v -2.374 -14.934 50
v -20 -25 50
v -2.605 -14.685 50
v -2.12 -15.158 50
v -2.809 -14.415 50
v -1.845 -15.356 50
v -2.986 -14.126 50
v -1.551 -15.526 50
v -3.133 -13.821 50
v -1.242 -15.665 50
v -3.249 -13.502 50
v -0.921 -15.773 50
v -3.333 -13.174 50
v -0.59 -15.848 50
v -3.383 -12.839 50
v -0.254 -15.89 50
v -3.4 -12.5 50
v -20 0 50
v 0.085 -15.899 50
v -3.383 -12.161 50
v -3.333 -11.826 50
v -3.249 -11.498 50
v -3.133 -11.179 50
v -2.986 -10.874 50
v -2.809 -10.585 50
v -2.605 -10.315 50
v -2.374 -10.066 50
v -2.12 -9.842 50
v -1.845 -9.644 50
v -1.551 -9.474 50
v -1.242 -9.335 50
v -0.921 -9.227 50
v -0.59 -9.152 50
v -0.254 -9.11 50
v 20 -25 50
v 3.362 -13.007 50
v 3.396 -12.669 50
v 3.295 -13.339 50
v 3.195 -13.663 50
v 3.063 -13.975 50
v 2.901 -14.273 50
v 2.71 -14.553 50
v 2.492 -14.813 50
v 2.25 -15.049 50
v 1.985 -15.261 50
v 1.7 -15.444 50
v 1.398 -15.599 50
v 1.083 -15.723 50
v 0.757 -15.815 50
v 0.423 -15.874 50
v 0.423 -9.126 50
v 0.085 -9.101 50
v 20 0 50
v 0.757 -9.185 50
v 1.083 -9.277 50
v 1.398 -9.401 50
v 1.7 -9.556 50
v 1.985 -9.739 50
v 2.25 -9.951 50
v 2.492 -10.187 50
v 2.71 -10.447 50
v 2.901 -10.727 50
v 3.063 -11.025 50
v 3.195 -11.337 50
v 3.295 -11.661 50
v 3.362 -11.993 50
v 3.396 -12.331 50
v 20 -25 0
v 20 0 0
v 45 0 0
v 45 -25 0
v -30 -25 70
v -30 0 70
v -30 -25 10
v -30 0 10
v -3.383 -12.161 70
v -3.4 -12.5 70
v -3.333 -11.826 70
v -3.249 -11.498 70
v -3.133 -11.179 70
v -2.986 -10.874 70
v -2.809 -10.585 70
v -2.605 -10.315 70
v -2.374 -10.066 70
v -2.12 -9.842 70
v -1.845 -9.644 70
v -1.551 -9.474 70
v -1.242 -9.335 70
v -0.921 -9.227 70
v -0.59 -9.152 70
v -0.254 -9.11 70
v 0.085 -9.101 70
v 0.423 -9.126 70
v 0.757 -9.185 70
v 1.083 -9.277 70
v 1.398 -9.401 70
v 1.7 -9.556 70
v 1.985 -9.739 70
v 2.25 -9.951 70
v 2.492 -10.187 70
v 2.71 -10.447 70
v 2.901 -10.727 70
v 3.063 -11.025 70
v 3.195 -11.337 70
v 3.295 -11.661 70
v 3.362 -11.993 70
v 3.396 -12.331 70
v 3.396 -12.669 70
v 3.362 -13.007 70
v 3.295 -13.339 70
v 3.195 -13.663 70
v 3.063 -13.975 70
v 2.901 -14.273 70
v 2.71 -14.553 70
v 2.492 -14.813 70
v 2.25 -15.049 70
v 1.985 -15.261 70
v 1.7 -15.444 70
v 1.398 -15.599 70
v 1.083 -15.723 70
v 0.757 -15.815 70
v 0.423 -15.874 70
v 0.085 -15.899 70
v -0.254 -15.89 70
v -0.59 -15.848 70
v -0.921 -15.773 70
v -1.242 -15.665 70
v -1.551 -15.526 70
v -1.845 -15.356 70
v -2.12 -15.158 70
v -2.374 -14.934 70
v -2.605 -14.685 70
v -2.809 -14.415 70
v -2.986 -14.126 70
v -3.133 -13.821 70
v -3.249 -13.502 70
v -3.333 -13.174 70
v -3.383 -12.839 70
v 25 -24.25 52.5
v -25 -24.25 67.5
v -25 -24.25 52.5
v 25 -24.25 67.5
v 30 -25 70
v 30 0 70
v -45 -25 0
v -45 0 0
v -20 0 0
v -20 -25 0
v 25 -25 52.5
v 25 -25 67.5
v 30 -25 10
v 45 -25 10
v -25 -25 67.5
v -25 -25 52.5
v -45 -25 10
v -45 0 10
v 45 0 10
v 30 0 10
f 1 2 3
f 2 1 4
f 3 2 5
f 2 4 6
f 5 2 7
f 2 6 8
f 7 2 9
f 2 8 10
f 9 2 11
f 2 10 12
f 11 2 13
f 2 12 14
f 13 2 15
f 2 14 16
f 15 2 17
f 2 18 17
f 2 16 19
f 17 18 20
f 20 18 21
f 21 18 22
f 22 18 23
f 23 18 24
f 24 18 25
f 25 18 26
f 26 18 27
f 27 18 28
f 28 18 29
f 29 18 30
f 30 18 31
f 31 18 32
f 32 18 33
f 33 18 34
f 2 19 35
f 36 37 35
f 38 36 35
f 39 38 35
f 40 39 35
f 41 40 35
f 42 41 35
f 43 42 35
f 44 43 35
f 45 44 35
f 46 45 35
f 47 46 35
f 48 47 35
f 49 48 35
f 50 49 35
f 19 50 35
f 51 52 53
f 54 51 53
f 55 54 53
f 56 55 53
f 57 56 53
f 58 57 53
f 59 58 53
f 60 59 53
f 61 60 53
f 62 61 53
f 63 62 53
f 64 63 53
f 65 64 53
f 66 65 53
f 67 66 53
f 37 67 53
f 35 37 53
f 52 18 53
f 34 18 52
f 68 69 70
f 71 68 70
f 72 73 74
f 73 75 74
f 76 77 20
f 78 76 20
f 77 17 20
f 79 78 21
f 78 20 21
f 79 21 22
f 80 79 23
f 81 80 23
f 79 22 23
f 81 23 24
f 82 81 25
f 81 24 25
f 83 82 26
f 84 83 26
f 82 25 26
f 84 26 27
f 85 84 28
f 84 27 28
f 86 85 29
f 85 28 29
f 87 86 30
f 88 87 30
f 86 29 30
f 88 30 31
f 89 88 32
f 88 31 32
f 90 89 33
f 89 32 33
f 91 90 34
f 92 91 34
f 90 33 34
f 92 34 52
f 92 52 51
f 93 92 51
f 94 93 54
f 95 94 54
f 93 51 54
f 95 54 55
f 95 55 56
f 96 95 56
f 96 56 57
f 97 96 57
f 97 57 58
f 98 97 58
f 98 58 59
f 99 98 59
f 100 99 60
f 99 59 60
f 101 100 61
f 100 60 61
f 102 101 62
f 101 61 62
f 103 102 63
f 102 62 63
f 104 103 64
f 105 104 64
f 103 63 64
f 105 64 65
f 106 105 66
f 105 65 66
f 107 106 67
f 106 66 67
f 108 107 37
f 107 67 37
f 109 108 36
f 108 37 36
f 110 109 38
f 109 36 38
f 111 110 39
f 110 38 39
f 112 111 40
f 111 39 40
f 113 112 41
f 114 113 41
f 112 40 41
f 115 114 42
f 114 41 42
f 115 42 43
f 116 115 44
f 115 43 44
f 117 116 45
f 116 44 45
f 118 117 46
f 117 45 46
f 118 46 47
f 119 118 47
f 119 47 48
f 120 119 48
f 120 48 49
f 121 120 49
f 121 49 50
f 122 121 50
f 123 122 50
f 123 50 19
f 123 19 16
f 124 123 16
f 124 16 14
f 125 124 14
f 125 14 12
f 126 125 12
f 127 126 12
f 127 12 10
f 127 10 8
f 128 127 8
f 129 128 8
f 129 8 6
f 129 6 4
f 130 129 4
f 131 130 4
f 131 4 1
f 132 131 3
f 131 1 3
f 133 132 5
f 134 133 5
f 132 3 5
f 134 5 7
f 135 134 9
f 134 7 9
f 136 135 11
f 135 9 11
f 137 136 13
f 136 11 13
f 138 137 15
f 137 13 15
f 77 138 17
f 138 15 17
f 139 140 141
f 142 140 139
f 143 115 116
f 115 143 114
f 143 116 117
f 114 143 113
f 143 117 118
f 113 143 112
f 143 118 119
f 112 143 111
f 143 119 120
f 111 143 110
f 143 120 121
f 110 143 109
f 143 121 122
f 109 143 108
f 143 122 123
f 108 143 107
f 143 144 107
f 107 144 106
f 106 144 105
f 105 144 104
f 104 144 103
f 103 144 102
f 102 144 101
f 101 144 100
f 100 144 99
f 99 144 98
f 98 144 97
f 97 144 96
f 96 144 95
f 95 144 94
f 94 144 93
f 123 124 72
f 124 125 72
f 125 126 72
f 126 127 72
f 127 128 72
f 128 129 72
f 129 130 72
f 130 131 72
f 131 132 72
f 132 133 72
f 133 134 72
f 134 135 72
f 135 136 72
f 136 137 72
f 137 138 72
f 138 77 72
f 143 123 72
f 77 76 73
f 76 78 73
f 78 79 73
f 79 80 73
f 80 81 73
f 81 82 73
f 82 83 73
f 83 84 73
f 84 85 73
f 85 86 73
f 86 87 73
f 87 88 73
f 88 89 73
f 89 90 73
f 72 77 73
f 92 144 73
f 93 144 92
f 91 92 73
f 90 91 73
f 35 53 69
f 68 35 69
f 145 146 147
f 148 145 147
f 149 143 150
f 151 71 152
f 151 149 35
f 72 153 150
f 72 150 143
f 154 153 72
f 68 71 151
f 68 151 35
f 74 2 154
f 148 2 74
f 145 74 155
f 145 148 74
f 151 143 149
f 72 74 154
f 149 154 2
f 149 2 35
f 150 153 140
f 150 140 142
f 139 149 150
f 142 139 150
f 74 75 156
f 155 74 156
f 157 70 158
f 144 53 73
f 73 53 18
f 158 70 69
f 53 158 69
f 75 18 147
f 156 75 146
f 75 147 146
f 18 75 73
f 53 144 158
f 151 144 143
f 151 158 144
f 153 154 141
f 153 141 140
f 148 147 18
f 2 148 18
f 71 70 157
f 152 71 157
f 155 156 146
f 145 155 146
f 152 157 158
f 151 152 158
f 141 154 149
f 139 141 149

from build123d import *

# Parameters (mm, degrees)
F1_DEPTH = 25
F3_D     = 6.8
F3_DEPTH = 14
F3_TIP   = 2.0429261047
F4_DEPTH = 10
F5_W     = 50
F5_H     = 15
F6_DEPTH = 0.75


with BuildPart() as f1:
    # F0 (on Front) → F1 (new body)
    with BuildSketch(Plane.XZ):
        Polygon((30, 60), (0, 60), (-30, 60), (-30, 10), (-45, 10), (-45, 0), (-20, 0), (-20, 50), (0, 50), (20, 50), (20, 0), (45, 0), (45, 10), (30, 10), align=None)
    extrude(amount=F1_DEPTH)

    # F3
    with Locations(Plane.XY.offset(60)):
        with Locations((0, -12.5)):
            Hole(F3_D / 2, depth=F3_DEPTH)
            with Locations((0, 0, -(F3_DEPTH + F3_TIP / 2))):  # 118° drill point
                Cone(0, F3_D / 2, F3_TIP, mode=Mode.SUBTRACT)

    # F4 (add): a face of the model
    f4_faces = [f1.faces().sort_by_distance(p)[0] for p in [
        (29.35, -12.5, 60),
    ]]
    extrude(f4_faces, amount=F4_DEPTH)

    # F5 (on face) → F6 (cut)
    with BuildSketch(Plane.XZ.offset(25)):
        with Locations((0, 60)):
            Rectangle(F5_W, F5_H)
    extrude(amount=-F6_DEPTH, mode=Mode.SUBTRACT)


solid = f1.part
